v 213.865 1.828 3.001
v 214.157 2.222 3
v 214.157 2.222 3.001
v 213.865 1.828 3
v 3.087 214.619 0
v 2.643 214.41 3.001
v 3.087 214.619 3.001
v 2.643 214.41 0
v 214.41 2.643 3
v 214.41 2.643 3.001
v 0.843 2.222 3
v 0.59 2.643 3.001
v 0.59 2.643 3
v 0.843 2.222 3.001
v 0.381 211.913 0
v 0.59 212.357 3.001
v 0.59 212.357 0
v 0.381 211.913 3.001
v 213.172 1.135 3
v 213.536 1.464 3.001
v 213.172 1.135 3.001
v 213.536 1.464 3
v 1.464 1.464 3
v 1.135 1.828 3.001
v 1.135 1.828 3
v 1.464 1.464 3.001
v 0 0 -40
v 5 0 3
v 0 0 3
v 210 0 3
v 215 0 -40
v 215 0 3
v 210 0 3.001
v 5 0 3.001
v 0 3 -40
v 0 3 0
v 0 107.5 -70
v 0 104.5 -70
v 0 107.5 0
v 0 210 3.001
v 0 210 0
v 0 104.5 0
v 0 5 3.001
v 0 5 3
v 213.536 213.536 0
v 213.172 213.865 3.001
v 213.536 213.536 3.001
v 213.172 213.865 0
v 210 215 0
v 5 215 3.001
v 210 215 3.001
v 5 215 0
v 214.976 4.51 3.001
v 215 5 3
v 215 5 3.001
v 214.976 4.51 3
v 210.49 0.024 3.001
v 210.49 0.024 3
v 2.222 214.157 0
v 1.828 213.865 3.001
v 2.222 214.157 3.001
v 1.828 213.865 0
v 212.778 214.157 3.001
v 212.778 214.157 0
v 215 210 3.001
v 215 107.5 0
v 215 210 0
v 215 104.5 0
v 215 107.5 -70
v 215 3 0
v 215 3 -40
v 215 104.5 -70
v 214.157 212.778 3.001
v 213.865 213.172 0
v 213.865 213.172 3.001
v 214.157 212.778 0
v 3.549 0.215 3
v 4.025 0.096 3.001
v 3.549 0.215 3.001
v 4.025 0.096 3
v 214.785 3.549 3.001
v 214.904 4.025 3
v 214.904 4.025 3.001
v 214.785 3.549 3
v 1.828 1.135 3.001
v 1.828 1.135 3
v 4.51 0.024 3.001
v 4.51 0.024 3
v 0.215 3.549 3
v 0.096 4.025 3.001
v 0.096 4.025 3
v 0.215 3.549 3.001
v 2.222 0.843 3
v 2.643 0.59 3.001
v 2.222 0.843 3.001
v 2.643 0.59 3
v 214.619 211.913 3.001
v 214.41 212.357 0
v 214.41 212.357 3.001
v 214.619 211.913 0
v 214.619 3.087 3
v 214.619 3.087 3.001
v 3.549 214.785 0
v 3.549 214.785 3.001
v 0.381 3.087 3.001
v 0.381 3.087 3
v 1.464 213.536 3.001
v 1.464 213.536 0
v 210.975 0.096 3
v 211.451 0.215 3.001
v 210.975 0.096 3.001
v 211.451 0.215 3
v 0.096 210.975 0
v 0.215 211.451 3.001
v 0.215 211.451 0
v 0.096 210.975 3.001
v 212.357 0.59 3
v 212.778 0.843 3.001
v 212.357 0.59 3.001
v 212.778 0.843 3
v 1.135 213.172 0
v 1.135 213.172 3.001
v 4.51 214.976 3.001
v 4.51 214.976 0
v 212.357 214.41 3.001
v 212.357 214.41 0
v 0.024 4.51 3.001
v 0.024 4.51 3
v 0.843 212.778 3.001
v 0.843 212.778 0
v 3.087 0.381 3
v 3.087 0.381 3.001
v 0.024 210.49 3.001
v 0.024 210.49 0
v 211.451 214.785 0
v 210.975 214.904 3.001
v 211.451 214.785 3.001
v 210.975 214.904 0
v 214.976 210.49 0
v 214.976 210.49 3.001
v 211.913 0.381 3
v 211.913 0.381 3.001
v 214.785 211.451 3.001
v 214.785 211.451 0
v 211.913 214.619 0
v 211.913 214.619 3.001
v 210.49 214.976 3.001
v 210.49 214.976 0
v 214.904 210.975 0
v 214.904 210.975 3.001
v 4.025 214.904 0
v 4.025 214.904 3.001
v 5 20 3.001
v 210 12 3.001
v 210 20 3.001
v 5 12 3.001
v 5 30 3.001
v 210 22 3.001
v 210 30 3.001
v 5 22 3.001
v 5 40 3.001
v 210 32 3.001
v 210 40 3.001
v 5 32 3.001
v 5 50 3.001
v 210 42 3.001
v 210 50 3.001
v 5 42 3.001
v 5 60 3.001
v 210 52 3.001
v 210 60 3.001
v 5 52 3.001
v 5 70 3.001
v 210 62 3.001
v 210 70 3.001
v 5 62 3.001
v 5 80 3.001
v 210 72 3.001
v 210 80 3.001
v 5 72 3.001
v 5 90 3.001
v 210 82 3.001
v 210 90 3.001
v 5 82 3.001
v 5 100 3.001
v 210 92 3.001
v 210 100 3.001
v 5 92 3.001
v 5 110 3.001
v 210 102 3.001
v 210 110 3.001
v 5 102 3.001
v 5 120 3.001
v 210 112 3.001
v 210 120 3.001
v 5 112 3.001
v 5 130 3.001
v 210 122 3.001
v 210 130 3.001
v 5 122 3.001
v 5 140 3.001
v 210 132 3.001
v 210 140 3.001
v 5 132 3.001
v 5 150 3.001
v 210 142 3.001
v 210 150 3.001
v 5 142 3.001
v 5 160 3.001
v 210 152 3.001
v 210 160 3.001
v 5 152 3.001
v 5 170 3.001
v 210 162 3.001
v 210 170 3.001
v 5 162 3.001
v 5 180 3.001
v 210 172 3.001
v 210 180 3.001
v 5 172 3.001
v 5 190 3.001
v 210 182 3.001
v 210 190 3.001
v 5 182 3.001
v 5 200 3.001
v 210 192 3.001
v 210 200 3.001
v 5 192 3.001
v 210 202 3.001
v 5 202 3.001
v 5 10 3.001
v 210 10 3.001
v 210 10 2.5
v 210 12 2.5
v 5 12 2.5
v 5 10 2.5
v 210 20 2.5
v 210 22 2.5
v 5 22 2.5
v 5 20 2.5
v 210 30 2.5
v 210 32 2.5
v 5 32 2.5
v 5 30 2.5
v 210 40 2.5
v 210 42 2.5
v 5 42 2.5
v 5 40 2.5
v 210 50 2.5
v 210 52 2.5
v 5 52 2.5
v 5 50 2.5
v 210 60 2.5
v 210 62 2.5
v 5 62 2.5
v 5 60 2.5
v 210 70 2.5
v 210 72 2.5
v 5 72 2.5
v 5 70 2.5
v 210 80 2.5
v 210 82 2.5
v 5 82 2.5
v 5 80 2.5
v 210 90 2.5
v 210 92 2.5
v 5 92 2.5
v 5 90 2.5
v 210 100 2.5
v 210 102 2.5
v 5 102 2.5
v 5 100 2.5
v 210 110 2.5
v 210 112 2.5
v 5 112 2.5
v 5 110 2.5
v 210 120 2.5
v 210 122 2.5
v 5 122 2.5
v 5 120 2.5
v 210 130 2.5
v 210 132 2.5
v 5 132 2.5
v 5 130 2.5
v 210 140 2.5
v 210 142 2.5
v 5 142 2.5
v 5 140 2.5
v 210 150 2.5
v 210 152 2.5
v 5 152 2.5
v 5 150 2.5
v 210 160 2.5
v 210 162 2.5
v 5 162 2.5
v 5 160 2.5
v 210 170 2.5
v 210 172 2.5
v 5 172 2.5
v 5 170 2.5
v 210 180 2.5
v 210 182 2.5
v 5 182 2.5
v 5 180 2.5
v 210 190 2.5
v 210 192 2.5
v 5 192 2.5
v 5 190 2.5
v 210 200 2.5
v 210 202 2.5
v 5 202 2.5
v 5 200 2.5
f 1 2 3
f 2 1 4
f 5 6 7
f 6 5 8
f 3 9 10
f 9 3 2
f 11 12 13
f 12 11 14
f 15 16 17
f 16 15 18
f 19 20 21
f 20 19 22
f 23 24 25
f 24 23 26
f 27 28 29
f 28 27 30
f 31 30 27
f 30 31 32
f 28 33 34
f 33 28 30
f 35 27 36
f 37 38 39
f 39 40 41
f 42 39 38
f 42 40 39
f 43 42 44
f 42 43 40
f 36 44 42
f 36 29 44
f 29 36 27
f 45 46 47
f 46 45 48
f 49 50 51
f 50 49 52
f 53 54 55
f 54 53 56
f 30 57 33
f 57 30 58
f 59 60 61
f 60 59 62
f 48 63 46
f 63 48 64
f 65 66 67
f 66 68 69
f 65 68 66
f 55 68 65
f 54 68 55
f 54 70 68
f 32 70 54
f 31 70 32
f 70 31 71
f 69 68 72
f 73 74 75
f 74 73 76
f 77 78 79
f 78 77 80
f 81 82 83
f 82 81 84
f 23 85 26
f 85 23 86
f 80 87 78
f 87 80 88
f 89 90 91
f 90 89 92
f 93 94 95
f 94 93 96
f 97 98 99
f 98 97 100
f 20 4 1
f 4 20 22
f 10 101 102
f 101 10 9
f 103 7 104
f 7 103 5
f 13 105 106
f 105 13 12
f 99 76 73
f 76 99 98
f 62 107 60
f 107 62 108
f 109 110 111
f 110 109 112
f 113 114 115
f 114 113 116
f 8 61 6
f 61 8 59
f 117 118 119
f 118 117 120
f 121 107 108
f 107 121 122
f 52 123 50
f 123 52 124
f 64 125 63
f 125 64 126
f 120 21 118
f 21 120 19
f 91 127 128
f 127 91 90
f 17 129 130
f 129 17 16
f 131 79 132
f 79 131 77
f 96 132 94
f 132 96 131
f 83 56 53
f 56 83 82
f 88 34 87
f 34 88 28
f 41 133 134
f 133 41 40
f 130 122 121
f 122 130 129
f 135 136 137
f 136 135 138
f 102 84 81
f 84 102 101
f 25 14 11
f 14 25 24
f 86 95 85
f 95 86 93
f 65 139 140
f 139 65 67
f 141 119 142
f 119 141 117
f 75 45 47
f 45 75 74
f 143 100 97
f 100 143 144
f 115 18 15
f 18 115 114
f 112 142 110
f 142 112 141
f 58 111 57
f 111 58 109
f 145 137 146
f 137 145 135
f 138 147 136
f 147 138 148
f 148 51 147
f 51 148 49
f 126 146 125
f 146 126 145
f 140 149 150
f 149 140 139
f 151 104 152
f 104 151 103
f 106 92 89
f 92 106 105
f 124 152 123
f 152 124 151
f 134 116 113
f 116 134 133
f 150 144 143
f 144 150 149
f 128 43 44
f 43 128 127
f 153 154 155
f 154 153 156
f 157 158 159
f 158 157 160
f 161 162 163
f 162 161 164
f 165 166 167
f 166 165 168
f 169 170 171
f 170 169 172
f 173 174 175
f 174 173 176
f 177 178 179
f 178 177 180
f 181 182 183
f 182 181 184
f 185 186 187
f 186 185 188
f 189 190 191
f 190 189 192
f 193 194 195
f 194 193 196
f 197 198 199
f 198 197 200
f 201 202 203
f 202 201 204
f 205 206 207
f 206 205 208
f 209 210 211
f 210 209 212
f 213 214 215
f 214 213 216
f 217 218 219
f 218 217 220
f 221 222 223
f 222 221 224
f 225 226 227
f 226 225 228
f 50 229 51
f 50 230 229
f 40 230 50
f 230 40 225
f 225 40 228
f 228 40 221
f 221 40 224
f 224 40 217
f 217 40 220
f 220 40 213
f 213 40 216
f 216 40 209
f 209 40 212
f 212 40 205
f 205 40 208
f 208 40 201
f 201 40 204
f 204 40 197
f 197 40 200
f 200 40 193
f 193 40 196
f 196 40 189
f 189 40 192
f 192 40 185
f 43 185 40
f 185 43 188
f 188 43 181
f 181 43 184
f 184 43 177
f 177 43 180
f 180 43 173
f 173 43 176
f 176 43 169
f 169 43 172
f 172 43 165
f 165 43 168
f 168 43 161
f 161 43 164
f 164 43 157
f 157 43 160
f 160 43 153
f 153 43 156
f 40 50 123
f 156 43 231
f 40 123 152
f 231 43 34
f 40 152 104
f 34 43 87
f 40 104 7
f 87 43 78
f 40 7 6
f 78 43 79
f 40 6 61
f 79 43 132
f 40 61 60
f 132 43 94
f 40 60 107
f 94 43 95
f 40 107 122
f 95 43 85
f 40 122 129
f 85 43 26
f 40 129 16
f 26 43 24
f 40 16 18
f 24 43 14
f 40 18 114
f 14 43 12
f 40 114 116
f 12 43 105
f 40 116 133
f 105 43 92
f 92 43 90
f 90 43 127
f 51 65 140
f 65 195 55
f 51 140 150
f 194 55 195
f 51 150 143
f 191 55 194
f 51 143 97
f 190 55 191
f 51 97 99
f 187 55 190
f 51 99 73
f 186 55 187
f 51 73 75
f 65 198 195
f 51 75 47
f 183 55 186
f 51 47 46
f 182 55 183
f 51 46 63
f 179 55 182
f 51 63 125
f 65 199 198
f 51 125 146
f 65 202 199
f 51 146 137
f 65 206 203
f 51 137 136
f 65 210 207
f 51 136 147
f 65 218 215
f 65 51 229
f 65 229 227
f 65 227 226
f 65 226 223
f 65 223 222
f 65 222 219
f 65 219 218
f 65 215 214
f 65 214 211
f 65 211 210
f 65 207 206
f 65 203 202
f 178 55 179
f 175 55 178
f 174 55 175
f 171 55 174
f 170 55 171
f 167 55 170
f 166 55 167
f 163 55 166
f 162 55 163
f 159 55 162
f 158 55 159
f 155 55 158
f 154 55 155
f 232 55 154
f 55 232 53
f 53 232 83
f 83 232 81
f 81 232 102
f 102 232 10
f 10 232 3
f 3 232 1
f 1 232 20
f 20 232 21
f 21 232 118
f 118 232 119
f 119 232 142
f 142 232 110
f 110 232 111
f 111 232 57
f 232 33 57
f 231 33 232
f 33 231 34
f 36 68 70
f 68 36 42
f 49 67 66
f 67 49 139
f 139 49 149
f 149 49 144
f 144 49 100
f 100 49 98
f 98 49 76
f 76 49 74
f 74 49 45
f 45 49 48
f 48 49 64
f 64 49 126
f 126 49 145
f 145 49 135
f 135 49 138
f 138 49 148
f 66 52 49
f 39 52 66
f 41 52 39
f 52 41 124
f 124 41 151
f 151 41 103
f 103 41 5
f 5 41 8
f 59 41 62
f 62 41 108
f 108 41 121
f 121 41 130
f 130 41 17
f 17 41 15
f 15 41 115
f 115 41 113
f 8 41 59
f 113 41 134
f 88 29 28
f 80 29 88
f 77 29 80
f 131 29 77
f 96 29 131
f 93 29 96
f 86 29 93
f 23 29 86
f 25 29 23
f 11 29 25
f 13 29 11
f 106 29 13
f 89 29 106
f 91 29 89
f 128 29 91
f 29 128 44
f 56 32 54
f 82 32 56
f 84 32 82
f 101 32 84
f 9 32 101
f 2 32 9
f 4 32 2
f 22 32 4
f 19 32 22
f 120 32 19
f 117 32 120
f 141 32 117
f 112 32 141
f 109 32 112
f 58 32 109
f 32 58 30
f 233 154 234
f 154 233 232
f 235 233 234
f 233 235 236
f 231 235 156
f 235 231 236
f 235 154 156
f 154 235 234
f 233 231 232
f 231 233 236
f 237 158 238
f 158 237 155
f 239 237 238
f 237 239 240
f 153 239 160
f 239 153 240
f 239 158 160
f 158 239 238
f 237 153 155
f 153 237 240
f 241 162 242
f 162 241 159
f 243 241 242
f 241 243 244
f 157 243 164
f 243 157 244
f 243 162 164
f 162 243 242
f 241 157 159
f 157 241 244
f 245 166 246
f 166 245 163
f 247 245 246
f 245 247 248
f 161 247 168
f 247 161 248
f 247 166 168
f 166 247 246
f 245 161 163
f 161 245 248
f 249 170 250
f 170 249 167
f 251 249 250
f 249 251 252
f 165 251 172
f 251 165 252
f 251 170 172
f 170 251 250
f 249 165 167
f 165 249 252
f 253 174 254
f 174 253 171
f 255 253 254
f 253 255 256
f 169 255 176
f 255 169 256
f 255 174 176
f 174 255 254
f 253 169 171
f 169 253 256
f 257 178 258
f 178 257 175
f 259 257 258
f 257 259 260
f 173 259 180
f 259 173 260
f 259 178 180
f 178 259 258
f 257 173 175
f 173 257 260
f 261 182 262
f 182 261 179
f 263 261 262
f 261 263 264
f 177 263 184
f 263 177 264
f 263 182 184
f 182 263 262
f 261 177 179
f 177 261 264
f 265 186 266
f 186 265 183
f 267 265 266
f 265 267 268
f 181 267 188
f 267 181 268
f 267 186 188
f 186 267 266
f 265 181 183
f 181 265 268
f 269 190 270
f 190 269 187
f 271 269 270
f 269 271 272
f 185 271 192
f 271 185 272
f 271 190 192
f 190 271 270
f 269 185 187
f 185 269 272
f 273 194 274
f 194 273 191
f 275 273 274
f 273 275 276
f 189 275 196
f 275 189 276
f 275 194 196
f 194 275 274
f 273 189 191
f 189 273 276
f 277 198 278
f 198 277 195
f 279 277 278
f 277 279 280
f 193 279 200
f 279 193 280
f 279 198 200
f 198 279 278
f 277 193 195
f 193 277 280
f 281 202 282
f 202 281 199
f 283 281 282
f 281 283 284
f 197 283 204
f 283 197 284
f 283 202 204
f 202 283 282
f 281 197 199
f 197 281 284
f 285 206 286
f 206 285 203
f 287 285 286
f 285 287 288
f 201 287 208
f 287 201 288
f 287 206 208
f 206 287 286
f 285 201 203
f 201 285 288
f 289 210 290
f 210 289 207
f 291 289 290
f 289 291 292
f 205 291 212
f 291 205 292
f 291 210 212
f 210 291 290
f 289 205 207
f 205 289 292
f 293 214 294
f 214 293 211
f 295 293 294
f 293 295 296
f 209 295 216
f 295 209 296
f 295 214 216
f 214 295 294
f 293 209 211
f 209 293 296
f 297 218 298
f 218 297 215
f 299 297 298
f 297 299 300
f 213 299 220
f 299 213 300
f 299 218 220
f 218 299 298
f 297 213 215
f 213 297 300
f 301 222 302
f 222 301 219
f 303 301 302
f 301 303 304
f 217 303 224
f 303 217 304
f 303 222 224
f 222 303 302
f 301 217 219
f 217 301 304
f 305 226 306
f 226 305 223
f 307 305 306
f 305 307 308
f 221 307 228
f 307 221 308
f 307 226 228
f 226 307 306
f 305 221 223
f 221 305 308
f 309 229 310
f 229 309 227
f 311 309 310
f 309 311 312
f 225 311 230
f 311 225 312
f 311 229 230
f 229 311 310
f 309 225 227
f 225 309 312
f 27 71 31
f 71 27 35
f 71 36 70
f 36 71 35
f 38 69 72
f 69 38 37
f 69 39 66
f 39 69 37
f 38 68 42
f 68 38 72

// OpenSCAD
    //
// Wohnmobil-Fensterbank
// Parametrisches Modell mit optimierter Customizer-Struktur
//

// ----------------------------------------------------------------------
// --- PARAMETER ---
// ----------------------------------------------------------------------

/* [A. GRUNDDIMENSIONEN PLATTE] */
// Breite (X)
01_shelf_width     = 215;   // [50:1:500]
// Tiefe (Y)
01_shelf_depth     = 215;   // [50:1:300]
// Dicke der Platte (Z)
01_shelf_thickness = 3;     // [2:0.5:10]

/* [B. KANTEN & VERFEINERUNG] */
// Radius der Abrundung (Vorder- und Seitenkanten)
02_front_radius    = 5;     // [0:0.5:10]

/* [C. ANTI-RUTSCH RILLEN (Vertiefungen)] */
03_grooves_enabled = true;   // [false, true] EIN/AUS-Schalter
// Tiefe der Rille
03_groove_depth    = 0.5;   // [0.1:0.1:2]
// Breite der Rille (entlang Y)
03_groove_width_x  = 2;     // [0.5:0.5:5]
// Abstand der Rillen (Mitte zu Mitte in Y)
03_groove_spacing_y= 10;    // [5:1:30]
// Startposition in Y (vom hinteren Rand y=0)
03_groove_offset_y = 10;    // [0:1:50]

/* [D. KLEMMUNG / HALTERUNG] */
// Abstand zwischen den INNENflächen der Halter (zu greifendes Element)
04_board_thickness = 101;    // [10:1:100]
// Spiel für die Klemmung (Anpassung an Druckergenauigkeit)
04_fit_clearance   = 0.5;   // [0:0.05:1]

/* [E. HALTERUNGS-MASSE] */
// Dicke des äußeren Halters (Y)
05_outer_br_thickness = 3   ;   // [1:1:10]
// Höhe des äußeren Halters (Z)
05_outer_br_height    = 40;  // [10:1:100]
// Dicke des inneren Halters (Y)
05_inner_br_thickness = 3;   // [1:1:10]
// Höhe des inneren Halters (Z)
05_inner_br_height    = 70;  // [10:1:100]

/* [F. OPTIONALER RAND (Deaktiviert)] */
06_rim_enabled     = false;  // [false, true] Rand an/aus
// Breite / Dicke des Randes (X/Y)
06_rim_width       = 5;     // [1:1:10]
// Höhe des Randes nach unten (Z)
06_rim_height      = 5;     // [1:1:10]


// ----------------------------------------------------------------------
// ---------- MODULE ----------
// (Alle Modul-Variablen wurden mit den entsprechenden Präfixen angepasst)
// ----------------------------------------------------------------------

// Modul zum Erstellen der Rillen (wird subtrahiert)
module anti_slip_grooves() {
   
    if (03_grooves_enabled) {
        
        num_grooves = floor((01_shelf_depth - 03_groove_offset_y) / 03_groove_spacing_y);
        
        for (i = [0 : 1 : num_grooves - 1]) {
            
            current_y = 03_groove_offset_y + i * 03_groove_spacing_y;
            groove_start_x = 02_front_radius; 
            groove_length_x = 01_shelf_width - 2 * 02_front_radius;
            
            // Rillenobjekt (Cube)
            translate([groove_start_x, current_y, 01_shelf_thickness - 03_groove_depth])
            cube([groove_length_x, 03_groove_width_x, 03_groove_depth + 0.01], center = false);
        }
    }
}


// Grundplatte + optionaler Rim
module base_plate_with_rim() {

    // --- 1. Korrigierte Grundplatte (Positiv-Objekt) ---
    difference() {
        
        union() {
            // a) Verrundeter Hauptteil
            translate([02_front_radius, 02_front_radius, 0])
            minkowski() {
                cube([01_shelf_width - 2*02_front_radius, 01_shelf_depth - 2*02_front_radius, 01_shelf_thickness], center = false);
                cylinder(r = 02_front_radius, h = 0.001, $fn = 64);
            }
            
            // b) Hinterer, gerader Teil
            translate([0, 0, 0])
                cube([01_shelf_width, 02_front_radius, 01_shelf_thickness], center = false);
        }
        
        // 2. Die ANTI-RUTSCH RILLEN (Negativ-Objekt)
        anti_slip_grooves();
        
    }
    
    // --- 2. Optionaler Rim (Derzeit deaktiviert) ---
    if (06_rim_enabled && 06_rim_height > 0 && 06_rim_width > 0) {
        
        inner_br_start_y = 05_outer_br_thickness + 04_board_thickness + 04_fit_clearance;
        inner_br_front_y = inner_br_start_y + 05_inner_br_thickness;
        rim_y_start = inner_br_front_y;
        rim_y_end   = 01_shelf_depth - 02_front_radius;
        rim_depth_y = rim_y_end - rim_y_start;
        
        if (rim_depth_y > 0) {
            
            rim_front_thickness = 06_rim_width;
            
            // FRONT-RAND (Verrundet)
            translate([02_front_radius, 01_shelf_depth - rim_front_thickness, -06_rim_height])
            minkowski() {
                cube([01_shelf_width - 2*02_front_radius, rim_front_thickness - 02_front_radius, 06_rim_height], center = false);
                cylinder(r = 02_front_radius, h = 0.001, $fn = 64);
            }
            // LINKER RAND (seitlich)
            translate([0, rim_y_start, -06_rim_height])
                cube([06_rim_width, rim_depth_y, 06_rim_height], center = false);
            // RECHTER RAND (seitlich)
            translate([01_shelf_width - 06_rim_width, rim_y_start, -06_rim_height])
                cube([06_rim_width, rim_depth_y, 06_rim_height], center = false);
        }
    }
}

// Halterungen auf der UNTERSEITE
module brackets() {
    // äußerer Halter (direkt an der Rückkante, nach UNTEN)
    translate([0, 0, -05_outer_br_height])
        cube([01_shelf_width, 05_outer_br_thickness, 05_outer_br_height], center = false);

    // innerer Halter (weiter vorne im Raum)
    translate([0,
               05_outer_br_thickness + 04_board_thickness + 04_fit_clearance,
               -05_inner_br_height])
        cube([01_shelf_width, 05_inner_br_thickness, 05_inner_br_height], center = false);
}

module fensterbank() {
    base_plate_with_rim();
    brackets();
}

// Aufruf
fensterbank();
